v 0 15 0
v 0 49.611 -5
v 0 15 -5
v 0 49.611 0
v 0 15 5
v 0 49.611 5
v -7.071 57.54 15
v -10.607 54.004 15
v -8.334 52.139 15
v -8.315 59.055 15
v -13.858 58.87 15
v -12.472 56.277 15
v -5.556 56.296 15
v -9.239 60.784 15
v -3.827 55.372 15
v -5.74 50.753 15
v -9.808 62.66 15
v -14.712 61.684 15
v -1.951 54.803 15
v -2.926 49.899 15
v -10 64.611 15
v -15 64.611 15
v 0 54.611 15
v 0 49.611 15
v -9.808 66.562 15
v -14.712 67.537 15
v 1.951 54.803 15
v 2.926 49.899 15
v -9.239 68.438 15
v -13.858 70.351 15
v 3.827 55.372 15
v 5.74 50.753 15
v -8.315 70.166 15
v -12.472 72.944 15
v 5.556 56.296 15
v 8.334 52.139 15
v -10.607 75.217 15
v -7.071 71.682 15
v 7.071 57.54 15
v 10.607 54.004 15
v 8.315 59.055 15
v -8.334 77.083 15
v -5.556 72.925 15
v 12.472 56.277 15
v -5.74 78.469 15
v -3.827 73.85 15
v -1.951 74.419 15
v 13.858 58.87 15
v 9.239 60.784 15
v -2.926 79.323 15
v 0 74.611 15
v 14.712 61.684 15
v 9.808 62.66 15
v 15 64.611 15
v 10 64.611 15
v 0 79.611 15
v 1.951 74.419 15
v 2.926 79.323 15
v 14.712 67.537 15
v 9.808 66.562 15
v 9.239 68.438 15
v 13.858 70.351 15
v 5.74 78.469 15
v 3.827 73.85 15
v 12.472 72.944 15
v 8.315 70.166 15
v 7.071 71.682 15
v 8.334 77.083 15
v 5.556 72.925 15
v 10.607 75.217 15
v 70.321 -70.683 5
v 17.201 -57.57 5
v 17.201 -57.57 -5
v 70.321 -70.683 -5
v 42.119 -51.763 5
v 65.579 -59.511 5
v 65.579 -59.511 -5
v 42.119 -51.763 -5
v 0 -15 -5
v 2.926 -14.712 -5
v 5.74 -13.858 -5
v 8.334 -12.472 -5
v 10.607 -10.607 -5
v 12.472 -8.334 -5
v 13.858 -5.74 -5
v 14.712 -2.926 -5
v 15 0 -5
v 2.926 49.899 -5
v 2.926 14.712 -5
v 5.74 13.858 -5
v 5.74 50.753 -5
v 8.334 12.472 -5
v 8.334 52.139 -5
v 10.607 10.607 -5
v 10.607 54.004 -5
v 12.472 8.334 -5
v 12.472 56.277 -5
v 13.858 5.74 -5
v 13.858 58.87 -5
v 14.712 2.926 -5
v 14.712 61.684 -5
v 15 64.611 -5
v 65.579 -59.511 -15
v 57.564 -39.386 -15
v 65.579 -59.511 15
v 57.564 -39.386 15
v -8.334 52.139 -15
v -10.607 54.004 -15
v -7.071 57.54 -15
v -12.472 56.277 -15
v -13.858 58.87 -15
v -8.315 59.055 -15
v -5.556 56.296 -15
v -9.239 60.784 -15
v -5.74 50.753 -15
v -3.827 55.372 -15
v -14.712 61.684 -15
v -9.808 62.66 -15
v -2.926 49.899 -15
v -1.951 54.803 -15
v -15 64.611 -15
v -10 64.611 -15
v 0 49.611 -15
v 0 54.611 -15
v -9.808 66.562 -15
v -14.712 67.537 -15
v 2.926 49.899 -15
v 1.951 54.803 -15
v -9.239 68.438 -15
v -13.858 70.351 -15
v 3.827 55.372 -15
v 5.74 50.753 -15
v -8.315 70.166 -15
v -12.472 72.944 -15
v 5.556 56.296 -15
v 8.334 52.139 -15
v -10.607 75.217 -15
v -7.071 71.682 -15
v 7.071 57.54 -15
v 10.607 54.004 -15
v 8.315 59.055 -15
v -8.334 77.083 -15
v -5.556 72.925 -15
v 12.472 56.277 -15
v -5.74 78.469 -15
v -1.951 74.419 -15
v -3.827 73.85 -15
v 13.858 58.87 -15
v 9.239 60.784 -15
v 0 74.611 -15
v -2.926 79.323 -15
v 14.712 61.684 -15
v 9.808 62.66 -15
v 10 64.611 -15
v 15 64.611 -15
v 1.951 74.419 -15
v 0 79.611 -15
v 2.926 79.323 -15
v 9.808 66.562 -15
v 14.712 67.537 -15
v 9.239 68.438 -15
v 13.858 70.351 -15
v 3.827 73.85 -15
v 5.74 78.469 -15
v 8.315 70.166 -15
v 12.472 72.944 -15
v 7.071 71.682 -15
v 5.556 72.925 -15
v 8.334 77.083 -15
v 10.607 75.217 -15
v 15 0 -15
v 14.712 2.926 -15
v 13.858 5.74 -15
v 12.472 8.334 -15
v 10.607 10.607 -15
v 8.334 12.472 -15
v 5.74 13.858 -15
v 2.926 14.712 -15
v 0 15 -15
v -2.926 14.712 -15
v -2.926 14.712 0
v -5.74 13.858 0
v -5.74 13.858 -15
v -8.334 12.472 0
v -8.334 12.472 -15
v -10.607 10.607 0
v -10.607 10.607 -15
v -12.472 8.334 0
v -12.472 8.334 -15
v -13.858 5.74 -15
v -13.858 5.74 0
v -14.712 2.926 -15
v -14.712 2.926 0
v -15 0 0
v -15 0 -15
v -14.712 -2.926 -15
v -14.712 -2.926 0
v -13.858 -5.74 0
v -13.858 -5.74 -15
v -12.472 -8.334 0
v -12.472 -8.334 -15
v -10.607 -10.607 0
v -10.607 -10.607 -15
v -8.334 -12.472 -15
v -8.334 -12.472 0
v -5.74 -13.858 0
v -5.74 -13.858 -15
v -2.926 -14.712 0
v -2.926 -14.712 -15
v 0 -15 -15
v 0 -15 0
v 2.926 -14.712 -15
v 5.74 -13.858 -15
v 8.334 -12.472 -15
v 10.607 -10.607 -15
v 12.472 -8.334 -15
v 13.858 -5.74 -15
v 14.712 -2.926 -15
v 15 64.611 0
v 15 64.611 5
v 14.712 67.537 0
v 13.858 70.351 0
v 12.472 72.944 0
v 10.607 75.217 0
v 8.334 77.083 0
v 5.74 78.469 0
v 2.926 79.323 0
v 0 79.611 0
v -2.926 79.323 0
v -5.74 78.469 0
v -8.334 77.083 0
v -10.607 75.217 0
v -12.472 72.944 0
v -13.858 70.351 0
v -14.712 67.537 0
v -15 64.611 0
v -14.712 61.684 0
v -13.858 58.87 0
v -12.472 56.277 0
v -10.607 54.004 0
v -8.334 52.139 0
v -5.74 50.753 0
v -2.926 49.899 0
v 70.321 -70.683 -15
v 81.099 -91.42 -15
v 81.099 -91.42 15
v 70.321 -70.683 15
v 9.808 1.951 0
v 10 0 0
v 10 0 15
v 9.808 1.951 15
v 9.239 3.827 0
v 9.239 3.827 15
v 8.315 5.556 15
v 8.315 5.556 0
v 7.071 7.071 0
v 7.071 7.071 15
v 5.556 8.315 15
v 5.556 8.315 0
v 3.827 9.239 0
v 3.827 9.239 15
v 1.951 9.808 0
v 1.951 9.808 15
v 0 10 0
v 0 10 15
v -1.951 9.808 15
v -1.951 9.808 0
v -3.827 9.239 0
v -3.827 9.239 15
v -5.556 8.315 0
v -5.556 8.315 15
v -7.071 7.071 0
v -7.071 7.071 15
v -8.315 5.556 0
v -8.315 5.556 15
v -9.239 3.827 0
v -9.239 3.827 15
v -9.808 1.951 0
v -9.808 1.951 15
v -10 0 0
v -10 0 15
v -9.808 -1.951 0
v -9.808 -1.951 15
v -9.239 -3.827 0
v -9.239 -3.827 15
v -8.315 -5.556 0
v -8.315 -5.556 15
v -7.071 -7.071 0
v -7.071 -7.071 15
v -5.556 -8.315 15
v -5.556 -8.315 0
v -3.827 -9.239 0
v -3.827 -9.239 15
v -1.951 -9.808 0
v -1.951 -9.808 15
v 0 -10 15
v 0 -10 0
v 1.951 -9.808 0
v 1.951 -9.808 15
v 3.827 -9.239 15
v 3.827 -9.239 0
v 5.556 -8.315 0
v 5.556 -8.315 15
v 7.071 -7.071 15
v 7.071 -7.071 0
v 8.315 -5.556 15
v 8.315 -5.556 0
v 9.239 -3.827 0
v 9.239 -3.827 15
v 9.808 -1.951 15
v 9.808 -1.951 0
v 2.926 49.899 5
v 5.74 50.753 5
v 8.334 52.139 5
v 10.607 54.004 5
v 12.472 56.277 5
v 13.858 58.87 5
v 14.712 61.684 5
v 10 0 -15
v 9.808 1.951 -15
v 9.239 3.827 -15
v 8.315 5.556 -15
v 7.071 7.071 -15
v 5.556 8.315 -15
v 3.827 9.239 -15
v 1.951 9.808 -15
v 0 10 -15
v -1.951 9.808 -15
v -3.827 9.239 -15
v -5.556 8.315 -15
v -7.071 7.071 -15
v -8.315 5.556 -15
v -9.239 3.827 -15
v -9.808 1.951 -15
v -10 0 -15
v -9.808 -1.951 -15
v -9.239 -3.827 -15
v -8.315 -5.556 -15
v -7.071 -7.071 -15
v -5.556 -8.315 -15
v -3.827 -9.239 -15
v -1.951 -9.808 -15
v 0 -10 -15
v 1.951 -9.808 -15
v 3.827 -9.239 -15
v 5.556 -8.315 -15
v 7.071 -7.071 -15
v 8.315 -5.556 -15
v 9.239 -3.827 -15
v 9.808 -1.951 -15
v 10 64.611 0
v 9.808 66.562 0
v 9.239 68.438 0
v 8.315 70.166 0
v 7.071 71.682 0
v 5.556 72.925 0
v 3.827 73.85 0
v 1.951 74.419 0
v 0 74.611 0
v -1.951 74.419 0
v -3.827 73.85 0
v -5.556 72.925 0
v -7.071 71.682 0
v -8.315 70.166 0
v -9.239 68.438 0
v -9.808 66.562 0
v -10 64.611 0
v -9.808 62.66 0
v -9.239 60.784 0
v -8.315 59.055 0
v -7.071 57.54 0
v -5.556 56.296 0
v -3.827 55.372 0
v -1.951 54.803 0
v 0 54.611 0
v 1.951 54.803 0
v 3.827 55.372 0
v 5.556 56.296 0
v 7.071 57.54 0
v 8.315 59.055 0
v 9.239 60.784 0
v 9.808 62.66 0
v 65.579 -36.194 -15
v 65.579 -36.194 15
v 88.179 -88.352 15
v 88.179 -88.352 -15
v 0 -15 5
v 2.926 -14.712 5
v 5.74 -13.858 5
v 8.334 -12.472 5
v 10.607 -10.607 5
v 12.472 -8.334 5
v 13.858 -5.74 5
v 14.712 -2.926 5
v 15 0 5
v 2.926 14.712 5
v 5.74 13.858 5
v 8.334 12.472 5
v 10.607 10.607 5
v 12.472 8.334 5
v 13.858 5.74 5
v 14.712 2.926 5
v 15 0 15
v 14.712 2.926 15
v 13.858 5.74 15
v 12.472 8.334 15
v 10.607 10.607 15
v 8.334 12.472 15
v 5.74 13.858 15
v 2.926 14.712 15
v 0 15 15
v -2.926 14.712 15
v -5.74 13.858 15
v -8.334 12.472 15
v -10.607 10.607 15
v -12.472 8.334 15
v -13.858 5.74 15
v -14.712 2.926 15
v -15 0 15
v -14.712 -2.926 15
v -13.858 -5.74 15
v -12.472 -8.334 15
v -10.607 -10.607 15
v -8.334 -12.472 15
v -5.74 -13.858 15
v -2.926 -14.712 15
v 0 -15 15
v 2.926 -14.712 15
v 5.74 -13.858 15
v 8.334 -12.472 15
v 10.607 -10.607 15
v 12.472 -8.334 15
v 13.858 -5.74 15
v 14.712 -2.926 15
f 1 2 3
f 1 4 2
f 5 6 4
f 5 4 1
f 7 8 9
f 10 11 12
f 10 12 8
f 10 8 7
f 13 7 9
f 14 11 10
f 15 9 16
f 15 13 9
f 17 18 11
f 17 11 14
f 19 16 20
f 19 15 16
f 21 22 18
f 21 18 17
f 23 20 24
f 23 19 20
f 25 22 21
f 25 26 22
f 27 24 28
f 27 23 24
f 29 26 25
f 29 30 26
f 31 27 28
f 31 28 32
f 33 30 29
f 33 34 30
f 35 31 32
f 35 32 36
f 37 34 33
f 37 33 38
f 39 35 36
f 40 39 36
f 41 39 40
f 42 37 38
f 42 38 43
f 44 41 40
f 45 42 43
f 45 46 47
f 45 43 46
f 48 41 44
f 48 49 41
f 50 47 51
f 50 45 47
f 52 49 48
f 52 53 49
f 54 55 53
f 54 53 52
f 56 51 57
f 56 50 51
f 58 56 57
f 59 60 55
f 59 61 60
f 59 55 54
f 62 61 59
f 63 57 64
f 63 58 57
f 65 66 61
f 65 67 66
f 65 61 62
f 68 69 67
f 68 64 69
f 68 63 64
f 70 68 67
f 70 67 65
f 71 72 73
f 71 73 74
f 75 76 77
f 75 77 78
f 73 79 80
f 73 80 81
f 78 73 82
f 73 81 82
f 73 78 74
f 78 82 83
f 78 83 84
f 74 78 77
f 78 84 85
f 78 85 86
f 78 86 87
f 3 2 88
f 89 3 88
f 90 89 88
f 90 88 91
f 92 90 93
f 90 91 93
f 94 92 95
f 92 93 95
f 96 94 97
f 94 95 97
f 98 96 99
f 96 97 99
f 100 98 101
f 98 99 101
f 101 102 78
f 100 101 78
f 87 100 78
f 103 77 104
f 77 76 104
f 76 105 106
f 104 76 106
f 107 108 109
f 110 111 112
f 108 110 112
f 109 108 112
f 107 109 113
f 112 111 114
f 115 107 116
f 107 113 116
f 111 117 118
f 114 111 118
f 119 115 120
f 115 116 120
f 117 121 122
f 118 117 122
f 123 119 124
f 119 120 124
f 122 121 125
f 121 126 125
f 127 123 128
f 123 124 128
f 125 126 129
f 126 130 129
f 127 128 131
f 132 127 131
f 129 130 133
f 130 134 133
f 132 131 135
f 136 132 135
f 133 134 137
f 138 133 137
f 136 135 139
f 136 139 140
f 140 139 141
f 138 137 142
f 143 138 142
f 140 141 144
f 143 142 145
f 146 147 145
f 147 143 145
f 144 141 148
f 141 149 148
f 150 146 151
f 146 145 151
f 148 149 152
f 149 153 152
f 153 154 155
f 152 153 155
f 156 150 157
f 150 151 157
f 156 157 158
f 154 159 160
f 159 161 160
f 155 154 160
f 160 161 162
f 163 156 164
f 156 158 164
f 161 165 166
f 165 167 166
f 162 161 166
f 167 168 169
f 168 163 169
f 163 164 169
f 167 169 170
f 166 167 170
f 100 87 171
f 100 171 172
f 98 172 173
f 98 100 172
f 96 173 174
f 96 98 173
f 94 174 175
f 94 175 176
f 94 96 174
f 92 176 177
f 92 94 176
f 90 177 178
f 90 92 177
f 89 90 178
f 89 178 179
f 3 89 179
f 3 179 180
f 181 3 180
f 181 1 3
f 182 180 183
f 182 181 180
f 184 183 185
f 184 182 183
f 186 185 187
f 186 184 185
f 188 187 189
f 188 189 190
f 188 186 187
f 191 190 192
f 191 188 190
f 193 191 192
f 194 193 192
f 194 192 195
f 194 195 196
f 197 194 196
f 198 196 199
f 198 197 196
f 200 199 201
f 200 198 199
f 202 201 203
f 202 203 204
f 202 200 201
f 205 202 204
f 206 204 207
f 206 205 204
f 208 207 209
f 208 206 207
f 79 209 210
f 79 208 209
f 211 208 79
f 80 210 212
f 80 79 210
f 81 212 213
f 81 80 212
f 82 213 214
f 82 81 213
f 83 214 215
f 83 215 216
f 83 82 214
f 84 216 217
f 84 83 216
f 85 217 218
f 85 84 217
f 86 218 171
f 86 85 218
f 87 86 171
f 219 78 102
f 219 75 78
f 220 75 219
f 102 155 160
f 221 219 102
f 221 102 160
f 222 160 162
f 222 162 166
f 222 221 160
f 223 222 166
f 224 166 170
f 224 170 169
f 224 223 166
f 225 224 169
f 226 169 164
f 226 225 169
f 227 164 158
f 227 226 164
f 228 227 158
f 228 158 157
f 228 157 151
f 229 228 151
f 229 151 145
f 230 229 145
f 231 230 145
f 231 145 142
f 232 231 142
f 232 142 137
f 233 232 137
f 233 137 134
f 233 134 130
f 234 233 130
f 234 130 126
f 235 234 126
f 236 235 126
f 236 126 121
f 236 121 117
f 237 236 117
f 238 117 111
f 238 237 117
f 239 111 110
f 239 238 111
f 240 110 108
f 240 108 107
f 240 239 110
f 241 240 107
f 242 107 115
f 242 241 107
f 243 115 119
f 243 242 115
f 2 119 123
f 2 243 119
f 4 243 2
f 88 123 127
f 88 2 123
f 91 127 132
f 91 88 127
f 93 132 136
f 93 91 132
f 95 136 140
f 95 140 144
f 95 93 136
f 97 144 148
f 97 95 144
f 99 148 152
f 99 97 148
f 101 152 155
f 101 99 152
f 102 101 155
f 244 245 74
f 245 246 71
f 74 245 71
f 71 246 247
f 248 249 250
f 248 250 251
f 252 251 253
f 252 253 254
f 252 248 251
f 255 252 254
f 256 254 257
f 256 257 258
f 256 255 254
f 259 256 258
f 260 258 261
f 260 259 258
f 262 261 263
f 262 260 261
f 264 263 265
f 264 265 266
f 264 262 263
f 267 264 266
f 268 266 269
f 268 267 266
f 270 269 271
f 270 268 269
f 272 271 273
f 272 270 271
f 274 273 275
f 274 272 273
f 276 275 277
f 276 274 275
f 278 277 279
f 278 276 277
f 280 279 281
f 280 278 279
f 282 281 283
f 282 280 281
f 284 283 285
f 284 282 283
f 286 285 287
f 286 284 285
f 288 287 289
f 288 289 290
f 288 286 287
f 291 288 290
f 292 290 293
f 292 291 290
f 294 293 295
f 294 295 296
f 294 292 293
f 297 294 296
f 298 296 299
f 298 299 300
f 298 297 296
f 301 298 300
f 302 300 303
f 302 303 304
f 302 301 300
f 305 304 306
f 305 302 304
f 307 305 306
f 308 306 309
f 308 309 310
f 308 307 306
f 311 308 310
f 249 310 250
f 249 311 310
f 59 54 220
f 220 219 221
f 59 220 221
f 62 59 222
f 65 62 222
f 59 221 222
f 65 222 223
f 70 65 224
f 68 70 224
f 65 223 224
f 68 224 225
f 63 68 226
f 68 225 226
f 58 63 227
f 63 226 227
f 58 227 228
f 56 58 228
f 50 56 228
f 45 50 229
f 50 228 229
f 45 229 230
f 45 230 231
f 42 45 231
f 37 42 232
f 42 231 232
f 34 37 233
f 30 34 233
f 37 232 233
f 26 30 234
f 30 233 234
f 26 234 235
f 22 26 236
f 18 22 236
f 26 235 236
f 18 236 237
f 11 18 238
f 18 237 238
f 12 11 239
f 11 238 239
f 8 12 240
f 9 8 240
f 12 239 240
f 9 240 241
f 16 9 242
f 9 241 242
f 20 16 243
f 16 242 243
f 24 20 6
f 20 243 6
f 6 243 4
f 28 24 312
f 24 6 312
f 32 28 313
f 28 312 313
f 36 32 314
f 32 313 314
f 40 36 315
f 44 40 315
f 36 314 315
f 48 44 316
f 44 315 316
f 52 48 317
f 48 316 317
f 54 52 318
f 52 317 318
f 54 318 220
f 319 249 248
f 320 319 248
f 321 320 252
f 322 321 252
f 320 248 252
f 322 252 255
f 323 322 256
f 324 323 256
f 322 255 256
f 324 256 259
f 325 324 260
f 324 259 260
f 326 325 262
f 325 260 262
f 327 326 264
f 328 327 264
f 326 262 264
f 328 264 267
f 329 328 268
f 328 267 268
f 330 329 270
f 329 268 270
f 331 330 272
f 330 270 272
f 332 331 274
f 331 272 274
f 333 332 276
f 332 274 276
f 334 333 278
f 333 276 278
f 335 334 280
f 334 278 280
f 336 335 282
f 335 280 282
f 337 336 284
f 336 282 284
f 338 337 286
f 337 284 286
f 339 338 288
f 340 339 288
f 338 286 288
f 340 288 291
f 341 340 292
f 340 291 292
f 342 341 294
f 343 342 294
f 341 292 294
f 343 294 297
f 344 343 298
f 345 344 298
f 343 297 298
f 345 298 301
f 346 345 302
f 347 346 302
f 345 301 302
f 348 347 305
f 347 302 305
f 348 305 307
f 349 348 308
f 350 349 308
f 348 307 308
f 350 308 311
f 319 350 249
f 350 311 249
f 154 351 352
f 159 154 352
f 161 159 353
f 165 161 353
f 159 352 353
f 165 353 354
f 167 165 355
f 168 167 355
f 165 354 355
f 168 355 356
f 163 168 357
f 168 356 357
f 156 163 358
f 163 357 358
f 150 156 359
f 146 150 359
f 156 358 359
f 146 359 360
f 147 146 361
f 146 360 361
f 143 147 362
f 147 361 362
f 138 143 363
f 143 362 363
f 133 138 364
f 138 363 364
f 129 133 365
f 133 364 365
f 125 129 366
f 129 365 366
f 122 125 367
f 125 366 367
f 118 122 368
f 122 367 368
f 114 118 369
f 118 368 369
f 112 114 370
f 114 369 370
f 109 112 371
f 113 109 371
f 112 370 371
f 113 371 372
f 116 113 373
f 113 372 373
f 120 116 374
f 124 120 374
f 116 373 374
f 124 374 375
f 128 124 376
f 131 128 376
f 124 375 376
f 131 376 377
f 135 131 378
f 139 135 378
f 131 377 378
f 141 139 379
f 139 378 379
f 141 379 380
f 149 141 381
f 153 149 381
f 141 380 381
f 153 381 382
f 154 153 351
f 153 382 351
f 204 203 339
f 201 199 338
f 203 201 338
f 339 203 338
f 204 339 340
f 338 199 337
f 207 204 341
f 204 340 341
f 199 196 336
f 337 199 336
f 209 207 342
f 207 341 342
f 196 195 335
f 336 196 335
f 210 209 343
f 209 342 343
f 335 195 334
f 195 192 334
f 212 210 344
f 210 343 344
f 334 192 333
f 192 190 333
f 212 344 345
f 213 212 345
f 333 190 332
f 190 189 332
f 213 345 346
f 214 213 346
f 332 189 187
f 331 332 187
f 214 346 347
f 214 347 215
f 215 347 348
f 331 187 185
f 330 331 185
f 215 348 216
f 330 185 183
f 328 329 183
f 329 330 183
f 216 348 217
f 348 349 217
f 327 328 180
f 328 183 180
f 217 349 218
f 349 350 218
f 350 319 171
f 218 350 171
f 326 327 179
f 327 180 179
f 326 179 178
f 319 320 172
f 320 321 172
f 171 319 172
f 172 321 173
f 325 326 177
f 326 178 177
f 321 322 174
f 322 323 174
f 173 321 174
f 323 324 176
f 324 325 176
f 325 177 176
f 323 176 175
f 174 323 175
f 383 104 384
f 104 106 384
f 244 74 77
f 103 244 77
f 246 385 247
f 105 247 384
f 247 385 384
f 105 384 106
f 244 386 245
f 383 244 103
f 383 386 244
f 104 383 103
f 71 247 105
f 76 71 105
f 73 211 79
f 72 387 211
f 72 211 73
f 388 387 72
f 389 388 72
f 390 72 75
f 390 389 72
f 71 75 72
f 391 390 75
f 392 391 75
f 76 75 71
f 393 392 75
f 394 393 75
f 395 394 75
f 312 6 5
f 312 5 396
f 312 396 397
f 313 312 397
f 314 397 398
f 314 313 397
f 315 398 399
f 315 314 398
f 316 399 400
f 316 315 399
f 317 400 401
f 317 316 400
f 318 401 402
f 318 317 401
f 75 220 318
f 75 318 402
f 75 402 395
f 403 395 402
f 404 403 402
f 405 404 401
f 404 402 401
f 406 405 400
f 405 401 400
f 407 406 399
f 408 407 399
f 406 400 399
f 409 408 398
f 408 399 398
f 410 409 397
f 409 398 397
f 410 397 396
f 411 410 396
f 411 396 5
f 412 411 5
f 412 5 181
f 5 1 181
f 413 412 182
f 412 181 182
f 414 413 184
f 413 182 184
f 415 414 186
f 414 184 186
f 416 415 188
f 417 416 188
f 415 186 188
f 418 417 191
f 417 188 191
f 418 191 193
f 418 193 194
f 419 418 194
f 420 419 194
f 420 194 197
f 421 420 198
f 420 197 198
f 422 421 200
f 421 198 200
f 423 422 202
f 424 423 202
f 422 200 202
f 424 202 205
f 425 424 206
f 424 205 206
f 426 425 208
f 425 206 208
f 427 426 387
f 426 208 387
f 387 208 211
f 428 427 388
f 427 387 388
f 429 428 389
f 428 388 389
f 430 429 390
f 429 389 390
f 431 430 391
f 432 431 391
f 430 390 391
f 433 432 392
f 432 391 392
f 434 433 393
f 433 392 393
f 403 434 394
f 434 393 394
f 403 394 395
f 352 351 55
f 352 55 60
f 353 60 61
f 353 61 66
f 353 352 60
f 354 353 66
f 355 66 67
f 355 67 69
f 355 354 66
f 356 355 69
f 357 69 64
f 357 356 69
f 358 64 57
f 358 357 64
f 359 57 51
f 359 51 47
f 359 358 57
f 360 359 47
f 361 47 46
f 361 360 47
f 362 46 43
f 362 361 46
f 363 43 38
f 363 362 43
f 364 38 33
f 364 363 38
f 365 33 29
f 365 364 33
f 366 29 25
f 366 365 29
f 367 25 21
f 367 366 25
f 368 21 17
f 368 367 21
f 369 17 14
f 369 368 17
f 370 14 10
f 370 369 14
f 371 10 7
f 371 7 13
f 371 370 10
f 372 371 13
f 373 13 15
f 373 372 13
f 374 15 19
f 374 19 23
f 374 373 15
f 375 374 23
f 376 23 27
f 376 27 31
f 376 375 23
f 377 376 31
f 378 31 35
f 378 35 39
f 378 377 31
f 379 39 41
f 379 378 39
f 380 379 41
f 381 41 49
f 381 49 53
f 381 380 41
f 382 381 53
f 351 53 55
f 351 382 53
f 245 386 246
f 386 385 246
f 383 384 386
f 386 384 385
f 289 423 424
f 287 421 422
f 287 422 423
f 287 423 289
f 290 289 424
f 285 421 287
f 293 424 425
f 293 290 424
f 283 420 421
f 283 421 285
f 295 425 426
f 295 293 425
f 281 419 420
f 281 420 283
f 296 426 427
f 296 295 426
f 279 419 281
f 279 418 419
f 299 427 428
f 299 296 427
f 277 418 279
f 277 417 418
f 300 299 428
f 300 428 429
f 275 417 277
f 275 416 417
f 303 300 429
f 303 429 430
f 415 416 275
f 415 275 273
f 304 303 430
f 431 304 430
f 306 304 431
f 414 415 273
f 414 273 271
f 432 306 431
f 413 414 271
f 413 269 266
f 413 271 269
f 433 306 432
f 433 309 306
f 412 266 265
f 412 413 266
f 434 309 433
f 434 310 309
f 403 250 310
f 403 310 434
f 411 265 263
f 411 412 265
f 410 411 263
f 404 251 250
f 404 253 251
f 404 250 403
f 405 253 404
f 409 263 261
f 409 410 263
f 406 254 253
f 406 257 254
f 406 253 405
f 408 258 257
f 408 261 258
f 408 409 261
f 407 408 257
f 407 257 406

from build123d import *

# Parameters (mm, degrees)
DODANIE_WYCI_GNI_CIE1_DEPTH = 5
SZKIC1_3_R                  = 15
SZKIC1_3_R_2                = 10
DODANIE_WYCI_GNI_CIE2_DEPTH = 15


with BuildPart() as part:
    # Szkic1 → Dodanie-wyciągnięcie1 (new, symmetric)
    with BuildSketch(Plane.XY):
        with BuildLine():
            Line((0, 49.610742159), (0, 15))
            ThreePointArc((0, 15), (10.606601718, 10.606601718), (15, 0))
            ThreePointArc((15, 0), (10.606601718, -10.606601718), (0, -15))
            Line((0, -15), (17.201404847, -57.569734598))
            Line((17.201404847, -57.569734598), (70.321075739, -70.682872454))
            Line((70.321075739, -70.682872454), (65.579282521, -59.511367123))
            Line((65.579282521, -59.511367123), (42.119104174, -51.763052014))
            Line((42.119104174, -51.763052014), (15, 64.610742159))
            ThreePointArc((15, 64.610742159), (10.606601718, 54.004140441), (0, 49.610742159))
        make_face()
    extrude(amount=DODANIE_WYCI_GNI_CIE1_DEPTH, both=True)

    # Szkic1<3> → Dodanie-wyciągnięcie2 (add, symmetric)
    # profile 1 of 3: a face of its own
    with BuildSketch(Plane.XY):
        Circle(SZKIC1_3_R)
        Circle(SZKIC1_3_R_2, mode=Mode.SUBTRACT)
    # profile 2 of 3: a face of its own
    with BuildSketch(Plane.XY):
        with Locations((0, 64.610742159)):
            Circle(SZKIC1_3_R)
        with Locations((0, 64.610742159)):
            Circle(SZKIC1_3_R_2, mode=Mode.SUBTRACT)
    # profile 3 of 3: a face of its own
    with BuildSketch(Plane.XY):
        Polygon((65.579282521, -59.511367123), (70.321075739, -70.682872454), (81.099328917, -91.419597771), (88.178535072, -88.35231955), (65.579282521, -36.193774991), (57.564045894, -39.385959721), align=None)
    extrude(amount=DODANIE_WYCI_GNI_CIE2_DEPTH, both=True)


solid = part.part
